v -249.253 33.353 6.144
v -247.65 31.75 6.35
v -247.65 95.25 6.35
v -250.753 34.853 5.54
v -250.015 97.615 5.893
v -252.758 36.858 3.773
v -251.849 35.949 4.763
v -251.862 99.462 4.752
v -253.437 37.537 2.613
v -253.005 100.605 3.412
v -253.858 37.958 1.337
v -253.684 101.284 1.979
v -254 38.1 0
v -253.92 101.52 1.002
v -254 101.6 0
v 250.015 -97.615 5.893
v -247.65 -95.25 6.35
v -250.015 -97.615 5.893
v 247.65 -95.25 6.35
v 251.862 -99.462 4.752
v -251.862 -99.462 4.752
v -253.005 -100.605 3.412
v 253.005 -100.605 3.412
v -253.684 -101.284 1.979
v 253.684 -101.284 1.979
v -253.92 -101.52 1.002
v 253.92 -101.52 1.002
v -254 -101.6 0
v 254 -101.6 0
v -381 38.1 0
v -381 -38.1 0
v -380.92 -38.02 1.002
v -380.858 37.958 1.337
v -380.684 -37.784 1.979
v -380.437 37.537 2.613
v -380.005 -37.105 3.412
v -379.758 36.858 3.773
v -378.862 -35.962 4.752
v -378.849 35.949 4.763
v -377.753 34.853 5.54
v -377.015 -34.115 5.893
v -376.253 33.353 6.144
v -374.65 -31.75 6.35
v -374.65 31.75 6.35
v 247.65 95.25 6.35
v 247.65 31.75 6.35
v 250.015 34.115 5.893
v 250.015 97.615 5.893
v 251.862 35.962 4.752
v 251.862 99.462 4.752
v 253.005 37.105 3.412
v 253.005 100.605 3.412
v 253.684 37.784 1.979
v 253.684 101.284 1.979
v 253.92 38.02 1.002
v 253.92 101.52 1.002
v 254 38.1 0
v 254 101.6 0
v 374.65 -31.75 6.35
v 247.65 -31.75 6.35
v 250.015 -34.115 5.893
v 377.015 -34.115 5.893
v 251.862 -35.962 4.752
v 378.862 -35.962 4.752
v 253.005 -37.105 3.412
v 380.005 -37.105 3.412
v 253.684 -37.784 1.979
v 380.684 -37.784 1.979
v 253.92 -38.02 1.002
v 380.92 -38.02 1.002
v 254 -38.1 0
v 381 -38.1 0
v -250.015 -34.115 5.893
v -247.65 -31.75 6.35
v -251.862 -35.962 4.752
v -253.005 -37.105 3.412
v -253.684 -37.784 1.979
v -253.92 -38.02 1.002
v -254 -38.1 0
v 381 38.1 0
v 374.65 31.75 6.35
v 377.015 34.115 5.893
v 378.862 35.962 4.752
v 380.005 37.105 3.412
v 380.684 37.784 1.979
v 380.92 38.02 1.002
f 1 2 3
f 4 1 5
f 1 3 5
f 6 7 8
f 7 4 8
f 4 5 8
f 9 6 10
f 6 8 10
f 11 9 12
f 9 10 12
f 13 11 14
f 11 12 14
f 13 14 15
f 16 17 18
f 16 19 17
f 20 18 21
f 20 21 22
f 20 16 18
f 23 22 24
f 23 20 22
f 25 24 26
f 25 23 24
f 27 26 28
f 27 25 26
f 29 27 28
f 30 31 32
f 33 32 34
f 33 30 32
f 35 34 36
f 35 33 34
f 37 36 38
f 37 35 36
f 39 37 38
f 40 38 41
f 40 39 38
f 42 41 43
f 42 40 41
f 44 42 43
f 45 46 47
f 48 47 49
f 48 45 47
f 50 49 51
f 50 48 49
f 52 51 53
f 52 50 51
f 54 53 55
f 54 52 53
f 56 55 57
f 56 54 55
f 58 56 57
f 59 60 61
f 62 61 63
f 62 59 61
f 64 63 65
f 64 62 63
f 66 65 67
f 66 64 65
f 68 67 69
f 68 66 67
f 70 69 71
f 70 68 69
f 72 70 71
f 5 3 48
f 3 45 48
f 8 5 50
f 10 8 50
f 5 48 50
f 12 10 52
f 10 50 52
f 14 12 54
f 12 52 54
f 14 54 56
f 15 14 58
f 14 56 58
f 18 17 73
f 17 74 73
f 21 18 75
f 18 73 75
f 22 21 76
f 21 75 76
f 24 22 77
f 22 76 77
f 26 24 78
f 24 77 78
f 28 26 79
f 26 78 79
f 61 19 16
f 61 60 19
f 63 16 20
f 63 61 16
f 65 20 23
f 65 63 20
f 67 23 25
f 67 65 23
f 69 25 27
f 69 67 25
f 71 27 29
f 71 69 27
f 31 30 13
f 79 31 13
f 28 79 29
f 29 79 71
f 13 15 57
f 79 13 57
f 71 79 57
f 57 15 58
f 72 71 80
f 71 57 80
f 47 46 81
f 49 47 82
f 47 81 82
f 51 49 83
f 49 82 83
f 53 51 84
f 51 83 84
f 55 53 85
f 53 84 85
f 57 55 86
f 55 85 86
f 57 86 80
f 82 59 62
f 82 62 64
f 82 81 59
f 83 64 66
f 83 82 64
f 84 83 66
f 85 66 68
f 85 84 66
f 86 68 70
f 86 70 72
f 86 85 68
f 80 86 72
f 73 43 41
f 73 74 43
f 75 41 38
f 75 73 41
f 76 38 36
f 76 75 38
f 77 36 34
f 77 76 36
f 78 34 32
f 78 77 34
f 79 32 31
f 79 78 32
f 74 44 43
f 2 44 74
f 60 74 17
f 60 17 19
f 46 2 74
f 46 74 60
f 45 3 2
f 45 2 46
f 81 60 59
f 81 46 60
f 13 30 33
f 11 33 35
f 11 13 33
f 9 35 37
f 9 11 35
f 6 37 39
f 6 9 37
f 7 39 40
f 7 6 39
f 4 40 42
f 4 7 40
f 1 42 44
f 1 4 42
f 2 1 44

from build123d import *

# Parameters (mm, degrees)
F0_W     = 762
F0_H     = 203.2
F1_DEPTH = 6.35
F2_W     = 127
F2_H     = 63.5
F3_DEPTH = 25.4
F4_W     = 127
F4_H     = 63.5
F5_DEPTH = 25.4
F6_W     = 127
F6_H     = 63.5
F7_DEPTH = 25.4
F8_W     = 127
F8_H     = 63.5
F9_DEPTH = 25.4
F10_R    = 6.34999


# Not quite as in the source:
# - a fillet or chamfer is up to 0.001 mm smaller than in the source, because OpenCascade refuses the exact size


with BuildPart() as f1:
    # F0 (on Top) → F1 (new body)
    with BuildSketch(Plane.XY):
        Rectangle(F0_W, F0_H)
    extrude(amount=F1_DEPTH)

    # F2 (on face) → F3 (cut)
    with BuildSketch(Plane.XY.offset(6.35)):
        with Locations((317.5, 69.85)):
            Rectangle(F2_W, F2_H)
    extrude(amount=-F3_DEPTH, mode=Mode.SUBTRACT)

    # F4 (on face) → F5 (cut)
    with BuildSketch(Plane.XY.offset(6.35)):
        with Locations((317.5, -69.85)):
            Rectangle(F4_W, F4_H)
    extrude(amount=-F5_DEPTH, mode=Mode.SUBTRACT)

    # F6 (on face) → F7 (cut)
    with BuildSketch(Plane.XY.offset(6.35)):
        with Locations((-317.5, 69.85)):
            Rectangle(F6_W, F6_H)
    extrude(amount=-F7_DEPTH, mode=Mode.SUBTRACT)

    # F8 (on face) → F9 (cut)
    with BuildSketch(Plane.XY.offset(6.35)):
        with Locations((-317.5, -69.85)):
            Rectangle(F8_W, F8_H)
    extrude(amount=-F9_DEPTH, mode=Mode.SUBTRACT)

    # F10 (radius 6.35 in the source; OpenCascade refuses exactly that, so slightly less here)
    f10_edges = [f1.edges().sort_by_distance(p)[0] for p in [
        (-317.5, 38.1, 6.35),
        (-254, 69.85, 6.35),
        (0, 101.6, 6.35),
        (254, 69.85, 6.35),
        (317.5, 38.1, 6.35),
        (381, 0, 6.35),
        (317.5, -38.1, 6.35),
        (254, -69.85, 6.35),
        (0, -101.6, 6.35),
        (-254, -69.85, 6.35),
        (-317.5, -38.1, 6.35),
        (-381, 0, 6.35),
    ]]
    fillet(f10_edges, radius=F10_R)


solid = f1.part
